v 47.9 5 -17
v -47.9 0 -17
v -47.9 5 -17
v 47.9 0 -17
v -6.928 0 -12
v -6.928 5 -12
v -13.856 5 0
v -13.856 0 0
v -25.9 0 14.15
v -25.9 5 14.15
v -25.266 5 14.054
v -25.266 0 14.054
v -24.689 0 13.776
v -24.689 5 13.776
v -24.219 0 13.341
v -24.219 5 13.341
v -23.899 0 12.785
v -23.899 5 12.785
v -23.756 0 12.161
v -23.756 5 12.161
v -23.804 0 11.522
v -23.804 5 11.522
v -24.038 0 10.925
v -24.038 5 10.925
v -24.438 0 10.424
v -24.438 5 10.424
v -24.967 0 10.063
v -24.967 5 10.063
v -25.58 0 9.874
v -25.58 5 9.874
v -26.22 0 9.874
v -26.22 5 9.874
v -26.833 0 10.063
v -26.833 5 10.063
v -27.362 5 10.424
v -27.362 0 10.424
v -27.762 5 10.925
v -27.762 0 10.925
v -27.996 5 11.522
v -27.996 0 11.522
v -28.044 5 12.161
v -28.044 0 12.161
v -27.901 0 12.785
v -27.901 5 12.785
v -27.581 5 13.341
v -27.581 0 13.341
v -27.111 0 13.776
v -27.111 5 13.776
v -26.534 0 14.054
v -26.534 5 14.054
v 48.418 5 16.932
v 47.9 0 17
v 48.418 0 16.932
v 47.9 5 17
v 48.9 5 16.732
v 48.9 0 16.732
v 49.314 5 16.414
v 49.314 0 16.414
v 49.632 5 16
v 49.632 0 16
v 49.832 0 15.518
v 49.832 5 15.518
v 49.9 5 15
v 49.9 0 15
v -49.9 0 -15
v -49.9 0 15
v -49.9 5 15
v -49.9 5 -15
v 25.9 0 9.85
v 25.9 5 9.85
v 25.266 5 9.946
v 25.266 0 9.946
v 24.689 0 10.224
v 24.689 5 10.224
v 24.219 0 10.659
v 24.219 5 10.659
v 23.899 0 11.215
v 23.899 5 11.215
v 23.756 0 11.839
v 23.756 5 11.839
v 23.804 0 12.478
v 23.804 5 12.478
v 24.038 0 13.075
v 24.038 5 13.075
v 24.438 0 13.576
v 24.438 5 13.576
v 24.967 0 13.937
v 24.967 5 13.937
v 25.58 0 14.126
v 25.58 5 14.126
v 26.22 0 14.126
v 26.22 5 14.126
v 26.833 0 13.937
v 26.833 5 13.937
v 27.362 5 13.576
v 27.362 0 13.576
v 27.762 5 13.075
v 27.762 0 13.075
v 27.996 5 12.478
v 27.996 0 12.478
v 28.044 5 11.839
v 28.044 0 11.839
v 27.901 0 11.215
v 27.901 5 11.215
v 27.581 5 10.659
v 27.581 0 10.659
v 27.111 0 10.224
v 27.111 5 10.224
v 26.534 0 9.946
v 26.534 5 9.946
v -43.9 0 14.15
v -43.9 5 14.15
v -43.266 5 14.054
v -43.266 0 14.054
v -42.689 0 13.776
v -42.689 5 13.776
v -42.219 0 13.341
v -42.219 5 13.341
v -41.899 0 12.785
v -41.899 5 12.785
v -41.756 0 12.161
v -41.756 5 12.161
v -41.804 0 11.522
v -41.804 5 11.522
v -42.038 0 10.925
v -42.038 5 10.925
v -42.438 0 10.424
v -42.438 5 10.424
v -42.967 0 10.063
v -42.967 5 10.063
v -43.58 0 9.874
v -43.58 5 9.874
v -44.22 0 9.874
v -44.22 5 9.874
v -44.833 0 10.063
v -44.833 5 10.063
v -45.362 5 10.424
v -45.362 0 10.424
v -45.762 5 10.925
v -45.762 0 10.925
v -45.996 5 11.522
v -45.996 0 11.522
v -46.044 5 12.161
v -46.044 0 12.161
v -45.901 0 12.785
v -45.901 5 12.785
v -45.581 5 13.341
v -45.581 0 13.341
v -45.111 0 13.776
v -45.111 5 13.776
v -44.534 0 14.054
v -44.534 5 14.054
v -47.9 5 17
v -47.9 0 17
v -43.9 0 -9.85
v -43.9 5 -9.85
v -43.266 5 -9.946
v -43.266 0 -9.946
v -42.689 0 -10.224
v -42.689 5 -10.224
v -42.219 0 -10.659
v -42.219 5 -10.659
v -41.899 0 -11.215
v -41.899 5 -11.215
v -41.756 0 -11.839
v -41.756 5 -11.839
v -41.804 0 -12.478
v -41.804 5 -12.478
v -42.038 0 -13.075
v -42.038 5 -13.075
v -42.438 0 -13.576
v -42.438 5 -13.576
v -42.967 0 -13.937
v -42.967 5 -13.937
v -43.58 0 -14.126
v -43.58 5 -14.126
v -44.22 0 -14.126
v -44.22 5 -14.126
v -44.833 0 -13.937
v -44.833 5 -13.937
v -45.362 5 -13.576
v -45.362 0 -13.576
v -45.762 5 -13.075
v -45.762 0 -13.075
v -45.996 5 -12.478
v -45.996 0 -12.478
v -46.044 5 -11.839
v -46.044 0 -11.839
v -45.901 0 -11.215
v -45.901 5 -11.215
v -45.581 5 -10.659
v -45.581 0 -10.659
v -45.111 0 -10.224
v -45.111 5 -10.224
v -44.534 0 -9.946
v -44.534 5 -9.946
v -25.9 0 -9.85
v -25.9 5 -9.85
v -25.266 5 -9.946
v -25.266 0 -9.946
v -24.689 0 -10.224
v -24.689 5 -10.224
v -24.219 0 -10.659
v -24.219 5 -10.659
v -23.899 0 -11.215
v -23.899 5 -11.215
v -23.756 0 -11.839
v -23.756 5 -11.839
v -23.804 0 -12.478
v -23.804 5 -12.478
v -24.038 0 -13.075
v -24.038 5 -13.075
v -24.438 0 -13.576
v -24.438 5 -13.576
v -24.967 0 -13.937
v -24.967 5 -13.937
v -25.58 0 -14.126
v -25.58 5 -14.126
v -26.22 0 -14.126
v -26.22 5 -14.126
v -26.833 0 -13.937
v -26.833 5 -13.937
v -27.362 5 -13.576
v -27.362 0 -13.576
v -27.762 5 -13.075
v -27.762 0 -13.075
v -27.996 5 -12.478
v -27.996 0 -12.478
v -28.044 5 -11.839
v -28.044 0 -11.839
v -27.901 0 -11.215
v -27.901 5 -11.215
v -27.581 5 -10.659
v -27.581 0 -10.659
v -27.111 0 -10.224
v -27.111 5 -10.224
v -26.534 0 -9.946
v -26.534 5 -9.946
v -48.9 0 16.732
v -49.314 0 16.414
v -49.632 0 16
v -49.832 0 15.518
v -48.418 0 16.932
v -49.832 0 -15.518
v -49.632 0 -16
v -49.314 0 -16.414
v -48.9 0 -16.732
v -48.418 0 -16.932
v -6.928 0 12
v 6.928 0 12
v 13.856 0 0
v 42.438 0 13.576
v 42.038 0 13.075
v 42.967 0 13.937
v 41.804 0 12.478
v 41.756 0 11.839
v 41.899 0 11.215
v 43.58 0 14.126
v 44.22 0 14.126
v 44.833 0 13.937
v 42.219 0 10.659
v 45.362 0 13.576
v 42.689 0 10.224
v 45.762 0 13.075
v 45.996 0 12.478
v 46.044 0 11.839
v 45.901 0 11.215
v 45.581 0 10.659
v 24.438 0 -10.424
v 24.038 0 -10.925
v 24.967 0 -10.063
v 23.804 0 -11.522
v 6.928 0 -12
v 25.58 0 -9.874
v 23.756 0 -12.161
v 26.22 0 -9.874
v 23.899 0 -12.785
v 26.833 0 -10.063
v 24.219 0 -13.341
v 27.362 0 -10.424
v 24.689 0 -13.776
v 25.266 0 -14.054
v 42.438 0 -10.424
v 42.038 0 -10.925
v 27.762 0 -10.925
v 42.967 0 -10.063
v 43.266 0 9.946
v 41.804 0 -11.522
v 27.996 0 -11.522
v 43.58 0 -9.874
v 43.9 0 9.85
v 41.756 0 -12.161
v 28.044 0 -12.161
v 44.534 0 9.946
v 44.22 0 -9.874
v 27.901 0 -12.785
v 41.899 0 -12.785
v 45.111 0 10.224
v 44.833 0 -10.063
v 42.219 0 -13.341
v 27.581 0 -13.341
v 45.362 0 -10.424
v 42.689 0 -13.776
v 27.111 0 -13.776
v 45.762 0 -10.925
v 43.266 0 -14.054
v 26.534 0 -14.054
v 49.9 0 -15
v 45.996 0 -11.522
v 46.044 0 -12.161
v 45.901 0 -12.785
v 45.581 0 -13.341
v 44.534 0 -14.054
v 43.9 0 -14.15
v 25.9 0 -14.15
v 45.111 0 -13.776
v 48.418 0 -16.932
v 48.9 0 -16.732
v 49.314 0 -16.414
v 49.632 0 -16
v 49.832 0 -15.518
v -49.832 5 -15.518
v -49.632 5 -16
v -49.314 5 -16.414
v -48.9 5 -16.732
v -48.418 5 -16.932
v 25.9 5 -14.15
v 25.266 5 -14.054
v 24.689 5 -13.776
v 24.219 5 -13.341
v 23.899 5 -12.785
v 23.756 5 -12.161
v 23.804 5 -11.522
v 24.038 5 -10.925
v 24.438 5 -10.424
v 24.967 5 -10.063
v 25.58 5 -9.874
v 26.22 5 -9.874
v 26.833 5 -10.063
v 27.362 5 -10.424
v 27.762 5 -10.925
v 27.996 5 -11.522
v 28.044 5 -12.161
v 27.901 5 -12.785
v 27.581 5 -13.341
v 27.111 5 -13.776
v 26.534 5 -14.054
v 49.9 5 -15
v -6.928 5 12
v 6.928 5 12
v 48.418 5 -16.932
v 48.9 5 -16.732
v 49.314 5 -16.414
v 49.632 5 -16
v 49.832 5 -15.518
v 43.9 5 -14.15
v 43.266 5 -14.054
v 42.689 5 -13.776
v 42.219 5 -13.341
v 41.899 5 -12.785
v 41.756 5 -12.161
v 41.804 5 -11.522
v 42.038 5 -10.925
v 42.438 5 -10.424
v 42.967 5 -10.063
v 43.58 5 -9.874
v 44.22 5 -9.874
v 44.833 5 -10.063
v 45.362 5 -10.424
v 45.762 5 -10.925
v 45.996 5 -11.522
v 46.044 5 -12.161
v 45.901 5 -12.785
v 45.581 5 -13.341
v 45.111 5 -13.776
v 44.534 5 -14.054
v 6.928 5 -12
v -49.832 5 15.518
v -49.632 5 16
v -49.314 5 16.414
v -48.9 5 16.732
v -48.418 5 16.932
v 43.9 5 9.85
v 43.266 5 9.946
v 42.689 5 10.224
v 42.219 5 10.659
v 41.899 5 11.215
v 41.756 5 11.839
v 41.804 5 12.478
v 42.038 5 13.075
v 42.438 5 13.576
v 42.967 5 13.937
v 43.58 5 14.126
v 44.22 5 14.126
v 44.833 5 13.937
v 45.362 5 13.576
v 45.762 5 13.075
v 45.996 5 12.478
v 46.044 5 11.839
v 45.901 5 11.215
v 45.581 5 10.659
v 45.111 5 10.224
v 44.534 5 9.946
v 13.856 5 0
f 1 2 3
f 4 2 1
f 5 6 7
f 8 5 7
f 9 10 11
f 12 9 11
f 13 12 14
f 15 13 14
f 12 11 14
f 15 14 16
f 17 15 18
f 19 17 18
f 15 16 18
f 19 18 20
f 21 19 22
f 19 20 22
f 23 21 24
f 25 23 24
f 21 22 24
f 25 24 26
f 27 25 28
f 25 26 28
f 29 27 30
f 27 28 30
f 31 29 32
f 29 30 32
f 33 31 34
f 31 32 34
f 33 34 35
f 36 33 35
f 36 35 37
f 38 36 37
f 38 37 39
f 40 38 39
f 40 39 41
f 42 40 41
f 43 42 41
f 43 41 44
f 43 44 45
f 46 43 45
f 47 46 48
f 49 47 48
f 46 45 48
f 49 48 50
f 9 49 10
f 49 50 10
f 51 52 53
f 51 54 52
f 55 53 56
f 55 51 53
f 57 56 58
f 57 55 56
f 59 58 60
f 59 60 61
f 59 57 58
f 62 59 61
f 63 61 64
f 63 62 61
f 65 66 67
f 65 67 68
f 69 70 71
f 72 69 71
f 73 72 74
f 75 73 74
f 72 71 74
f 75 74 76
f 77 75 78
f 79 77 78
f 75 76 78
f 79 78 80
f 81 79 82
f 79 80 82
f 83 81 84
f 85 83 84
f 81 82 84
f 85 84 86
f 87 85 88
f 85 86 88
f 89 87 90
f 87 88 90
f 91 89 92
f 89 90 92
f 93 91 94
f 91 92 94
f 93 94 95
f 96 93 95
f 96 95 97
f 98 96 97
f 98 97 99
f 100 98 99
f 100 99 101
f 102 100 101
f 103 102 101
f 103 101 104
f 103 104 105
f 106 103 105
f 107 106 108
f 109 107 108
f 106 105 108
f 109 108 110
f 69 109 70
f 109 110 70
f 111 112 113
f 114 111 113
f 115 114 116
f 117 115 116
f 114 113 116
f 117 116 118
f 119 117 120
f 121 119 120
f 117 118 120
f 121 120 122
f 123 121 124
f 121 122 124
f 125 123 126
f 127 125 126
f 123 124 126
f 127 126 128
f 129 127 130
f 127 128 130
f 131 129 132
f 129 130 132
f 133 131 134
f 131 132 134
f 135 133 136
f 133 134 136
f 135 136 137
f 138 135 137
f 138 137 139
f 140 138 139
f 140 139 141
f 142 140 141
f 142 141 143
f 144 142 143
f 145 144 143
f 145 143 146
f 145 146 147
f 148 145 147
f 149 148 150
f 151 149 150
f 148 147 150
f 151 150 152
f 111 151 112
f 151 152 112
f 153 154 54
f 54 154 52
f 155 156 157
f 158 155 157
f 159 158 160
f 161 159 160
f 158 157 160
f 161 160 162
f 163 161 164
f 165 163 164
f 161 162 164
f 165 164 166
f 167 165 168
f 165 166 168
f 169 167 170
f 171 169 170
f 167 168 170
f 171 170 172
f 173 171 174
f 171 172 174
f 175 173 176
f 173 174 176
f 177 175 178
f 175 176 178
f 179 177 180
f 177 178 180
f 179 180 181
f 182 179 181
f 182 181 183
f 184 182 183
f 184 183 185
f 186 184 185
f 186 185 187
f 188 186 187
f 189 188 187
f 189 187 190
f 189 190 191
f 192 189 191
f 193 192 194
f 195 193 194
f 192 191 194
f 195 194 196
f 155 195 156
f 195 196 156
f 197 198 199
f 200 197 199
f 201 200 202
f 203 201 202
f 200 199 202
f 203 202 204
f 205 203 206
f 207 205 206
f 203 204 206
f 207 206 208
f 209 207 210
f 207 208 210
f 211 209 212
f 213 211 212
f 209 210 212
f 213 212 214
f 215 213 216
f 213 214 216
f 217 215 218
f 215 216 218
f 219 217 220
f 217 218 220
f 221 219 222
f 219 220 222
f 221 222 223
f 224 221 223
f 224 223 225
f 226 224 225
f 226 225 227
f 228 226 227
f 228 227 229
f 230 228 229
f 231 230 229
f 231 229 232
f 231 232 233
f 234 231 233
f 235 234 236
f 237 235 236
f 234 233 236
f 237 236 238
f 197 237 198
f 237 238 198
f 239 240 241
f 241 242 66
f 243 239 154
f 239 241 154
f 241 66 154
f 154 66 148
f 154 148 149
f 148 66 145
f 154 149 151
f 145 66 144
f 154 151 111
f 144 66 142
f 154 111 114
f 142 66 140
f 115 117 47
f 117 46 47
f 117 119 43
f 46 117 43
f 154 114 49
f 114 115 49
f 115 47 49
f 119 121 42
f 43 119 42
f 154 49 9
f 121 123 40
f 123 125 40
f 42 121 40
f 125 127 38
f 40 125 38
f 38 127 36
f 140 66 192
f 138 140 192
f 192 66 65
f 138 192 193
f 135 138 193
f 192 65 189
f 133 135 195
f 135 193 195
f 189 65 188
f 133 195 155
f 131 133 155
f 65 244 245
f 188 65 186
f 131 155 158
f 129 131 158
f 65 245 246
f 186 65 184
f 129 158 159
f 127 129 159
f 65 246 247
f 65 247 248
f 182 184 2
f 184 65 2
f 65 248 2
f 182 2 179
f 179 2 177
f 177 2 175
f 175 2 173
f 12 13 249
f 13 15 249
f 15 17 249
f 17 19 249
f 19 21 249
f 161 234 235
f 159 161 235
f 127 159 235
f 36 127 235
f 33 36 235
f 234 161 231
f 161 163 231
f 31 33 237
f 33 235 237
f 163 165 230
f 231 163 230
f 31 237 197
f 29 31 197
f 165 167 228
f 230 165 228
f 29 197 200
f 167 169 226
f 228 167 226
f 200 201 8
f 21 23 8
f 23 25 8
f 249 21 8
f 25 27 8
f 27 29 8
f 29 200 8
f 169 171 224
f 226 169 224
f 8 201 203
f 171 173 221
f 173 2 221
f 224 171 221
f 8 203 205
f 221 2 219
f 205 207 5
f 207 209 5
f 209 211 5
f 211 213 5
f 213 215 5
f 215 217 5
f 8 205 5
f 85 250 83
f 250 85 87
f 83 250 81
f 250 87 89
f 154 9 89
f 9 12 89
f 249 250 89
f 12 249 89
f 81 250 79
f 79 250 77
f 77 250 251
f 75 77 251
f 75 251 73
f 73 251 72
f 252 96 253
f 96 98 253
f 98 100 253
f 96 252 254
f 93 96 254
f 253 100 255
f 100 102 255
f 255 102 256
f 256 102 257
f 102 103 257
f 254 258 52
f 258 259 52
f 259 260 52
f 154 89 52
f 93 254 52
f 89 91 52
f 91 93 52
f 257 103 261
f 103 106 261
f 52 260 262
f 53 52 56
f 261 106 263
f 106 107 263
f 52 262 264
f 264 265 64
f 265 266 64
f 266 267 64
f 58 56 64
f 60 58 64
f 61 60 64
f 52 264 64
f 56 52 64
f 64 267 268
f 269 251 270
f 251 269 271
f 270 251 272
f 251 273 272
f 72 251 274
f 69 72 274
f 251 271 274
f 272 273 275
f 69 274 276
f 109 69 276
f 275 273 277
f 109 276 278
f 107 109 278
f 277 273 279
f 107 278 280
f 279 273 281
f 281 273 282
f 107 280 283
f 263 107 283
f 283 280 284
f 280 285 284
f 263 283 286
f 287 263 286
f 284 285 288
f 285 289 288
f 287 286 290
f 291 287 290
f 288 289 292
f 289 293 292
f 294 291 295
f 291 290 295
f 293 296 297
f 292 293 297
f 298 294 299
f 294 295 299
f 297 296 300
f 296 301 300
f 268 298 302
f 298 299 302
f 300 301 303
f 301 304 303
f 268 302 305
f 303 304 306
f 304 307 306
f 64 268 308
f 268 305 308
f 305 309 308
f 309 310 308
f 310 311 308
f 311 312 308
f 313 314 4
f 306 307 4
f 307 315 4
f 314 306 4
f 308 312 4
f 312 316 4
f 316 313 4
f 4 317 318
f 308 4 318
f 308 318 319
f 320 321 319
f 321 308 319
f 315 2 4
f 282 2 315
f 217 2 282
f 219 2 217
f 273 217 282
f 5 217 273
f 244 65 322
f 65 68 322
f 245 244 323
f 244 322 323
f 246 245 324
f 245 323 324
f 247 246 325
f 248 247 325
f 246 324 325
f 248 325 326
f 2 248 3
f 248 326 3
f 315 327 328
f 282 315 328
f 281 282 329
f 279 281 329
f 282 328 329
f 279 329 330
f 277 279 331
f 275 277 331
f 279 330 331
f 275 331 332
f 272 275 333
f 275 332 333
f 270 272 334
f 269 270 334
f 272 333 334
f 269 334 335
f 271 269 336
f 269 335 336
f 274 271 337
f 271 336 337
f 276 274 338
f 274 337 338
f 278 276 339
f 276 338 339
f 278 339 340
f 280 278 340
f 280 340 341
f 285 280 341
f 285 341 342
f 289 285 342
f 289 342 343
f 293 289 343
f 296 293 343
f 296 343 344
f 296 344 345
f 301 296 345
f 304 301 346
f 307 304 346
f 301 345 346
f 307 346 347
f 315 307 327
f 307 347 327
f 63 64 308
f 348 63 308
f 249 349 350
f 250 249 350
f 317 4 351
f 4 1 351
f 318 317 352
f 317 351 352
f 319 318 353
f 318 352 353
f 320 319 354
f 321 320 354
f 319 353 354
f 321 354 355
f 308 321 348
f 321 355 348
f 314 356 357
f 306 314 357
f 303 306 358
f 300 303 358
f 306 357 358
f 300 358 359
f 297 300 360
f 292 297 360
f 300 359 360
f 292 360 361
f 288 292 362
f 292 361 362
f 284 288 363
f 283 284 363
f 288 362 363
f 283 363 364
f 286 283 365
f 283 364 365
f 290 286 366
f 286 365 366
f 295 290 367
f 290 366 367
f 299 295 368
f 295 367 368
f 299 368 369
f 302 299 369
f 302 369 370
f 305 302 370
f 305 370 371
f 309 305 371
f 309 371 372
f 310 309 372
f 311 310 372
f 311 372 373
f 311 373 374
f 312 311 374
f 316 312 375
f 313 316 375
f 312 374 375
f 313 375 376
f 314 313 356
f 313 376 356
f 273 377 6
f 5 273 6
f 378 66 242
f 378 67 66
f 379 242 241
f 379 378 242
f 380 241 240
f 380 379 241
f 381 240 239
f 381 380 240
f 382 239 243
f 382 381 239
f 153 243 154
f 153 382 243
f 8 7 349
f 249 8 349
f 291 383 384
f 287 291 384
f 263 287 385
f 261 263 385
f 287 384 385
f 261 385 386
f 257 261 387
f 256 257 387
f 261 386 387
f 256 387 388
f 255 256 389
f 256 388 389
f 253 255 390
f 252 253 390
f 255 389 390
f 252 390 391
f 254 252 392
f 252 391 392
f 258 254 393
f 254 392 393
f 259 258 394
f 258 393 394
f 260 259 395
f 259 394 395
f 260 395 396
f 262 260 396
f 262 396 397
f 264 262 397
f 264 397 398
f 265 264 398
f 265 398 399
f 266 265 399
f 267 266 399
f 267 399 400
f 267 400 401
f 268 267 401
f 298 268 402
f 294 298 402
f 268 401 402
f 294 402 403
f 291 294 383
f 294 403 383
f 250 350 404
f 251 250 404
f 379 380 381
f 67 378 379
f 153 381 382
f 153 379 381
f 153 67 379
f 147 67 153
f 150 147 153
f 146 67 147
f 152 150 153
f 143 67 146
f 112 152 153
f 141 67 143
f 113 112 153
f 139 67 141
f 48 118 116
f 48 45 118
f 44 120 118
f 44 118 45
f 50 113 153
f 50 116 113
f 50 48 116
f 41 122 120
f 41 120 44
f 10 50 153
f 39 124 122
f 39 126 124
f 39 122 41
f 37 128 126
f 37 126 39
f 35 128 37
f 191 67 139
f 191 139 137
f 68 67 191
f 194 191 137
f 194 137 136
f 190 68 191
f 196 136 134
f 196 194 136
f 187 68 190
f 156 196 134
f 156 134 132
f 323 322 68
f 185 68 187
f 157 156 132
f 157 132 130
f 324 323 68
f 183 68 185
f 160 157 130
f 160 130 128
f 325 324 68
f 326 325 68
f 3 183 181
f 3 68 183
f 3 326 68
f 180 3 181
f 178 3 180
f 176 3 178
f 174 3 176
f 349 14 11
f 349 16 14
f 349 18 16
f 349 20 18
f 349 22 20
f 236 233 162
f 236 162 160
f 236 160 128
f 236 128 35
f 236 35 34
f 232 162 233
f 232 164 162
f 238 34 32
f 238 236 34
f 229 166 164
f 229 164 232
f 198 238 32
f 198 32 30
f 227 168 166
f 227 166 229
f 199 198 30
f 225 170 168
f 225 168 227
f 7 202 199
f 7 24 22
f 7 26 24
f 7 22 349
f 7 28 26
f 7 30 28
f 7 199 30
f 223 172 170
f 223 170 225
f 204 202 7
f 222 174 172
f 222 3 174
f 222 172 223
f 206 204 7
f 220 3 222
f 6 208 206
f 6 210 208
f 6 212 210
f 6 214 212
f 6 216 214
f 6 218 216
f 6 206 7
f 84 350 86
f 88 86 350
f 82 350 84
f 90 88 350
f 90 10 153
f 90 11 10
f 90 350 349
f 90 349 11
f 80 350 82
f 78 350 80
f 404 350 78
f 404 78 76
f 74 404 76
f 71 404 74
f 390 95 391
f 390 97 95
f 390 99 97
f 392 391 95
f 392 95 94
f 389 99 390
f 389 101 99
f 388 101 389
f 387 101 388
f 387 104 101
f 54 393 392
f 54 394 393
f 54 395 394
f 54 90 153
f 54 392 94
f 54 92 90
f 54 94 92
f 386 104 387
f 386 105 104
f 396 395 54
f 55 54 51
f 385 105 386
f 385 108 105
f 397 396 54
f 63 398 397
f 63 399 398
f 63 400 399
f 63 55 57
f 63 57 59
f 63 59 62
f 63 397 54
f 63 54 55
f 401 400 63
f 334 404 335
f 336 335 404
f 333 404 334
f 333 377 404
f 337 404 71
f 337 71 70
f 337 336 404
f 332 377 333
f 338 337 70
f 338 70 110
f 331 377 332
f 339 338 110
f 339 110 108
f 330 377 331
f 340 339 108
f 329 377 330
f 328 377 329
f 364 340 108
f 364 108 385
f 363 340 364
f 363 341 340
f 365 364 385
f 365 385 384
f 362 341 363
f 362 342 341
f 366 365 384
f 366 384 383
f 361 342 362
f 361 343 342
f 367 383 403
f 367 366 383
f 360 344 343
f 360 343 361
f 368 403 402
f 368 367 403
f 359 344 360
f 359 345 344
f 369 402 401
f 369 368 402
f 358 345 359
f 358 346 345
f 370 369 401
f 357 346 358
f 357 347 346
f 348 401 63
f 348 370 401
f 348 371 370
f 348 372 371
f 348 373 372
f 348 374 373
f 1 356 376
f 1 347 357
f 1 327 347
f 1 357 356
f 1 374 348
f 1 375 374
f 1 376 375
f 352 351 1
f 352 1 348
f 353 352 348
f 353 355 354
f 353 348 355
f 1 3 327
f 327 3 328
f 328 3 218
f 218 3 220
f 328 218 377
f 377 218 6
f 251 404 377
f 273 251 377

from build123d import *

# Parameters (mm, degrees)
SKETCH1_W           = 99.8
SKETCH1_H           = 34
BOSS_EXTRUDE1_DEPTH = 5
SKETCH2_R           = 2.15
CUT_EXTRUDE1_DEPTH  = 5
FILLET1_R           = 2


with BuildPart() as part:
    # Sketch1 → Boss-Extrude1 (new body)
    with BuildSketch(Plane(origin=(0, 0, 0), x_dir=(1, 0, 0), z_dir=(0, 1, 0))):
        Rectangle(SKETCH1_W, SKETCH1_H)
    extrude(amount=BOSS_EXTRUDE1_DEPTH)

    # Sketch2 → Cut-Extrude1 (cut)
    with BuildSketch(Plane(origin=(0, 5, 0), x_dir=(1, 0, 0), z_dir=(0, 1, 0))):
        with Locations(Location((-43.9, 12, 0), (0, 0, 270))):
            Circle(SKETCH2_R)
        with Locations(Location((-25.9, 12, 0), (0, 0, 270))):
            Circle(SKETCH2_R)
        with Locations(Location((-43.9, -12, 0), (0, 0, 270))):
            Circle(SKETCH2_R)
        with Locations(Location((-25.9, -12, 0), (0, 0, 270))):
            Circle(SKETCH2_R)
        with Locations(Location((25.9, -12, 0), (0, 0, 90))):
            Circle(SKETCH2_R)
        with Locations(Location((43.9, -12, 0), (0, 0, 90))):
            Circle(SKETCH2_R)
        with Locations(Location((25.9, 12, 0), (0, 0, 90))):
            Circle(SKETCH2_R)
        with Locations(Location((43.9, 12, 0), (0, 0, 90))):
            Circle(SKETCH2_R)
        Polygon((-13.856406461, 0), (-6.92820323, -12), (6.92820323, -12), (13.856406461, 0), (6.92820323, 12), (-6.92820323, 12), align=None)
    extrude(amount=-CUT_EXTRUDE1_DEPTH, mode=Mode.SUBTRACT)

    # Fillet1
    fillet1_edges = [part.edges().sort_by_distance(p)[0] for p in [
        (-49.9, 2.5, -17),
        (49.9, 2.5, -17),
        (49.9, 2.5, 17),
        (-49.9, 2.5, 17),
    ]]
    fillet(fillet1_edges, radius=FILLET1_R)


solid = part.part
